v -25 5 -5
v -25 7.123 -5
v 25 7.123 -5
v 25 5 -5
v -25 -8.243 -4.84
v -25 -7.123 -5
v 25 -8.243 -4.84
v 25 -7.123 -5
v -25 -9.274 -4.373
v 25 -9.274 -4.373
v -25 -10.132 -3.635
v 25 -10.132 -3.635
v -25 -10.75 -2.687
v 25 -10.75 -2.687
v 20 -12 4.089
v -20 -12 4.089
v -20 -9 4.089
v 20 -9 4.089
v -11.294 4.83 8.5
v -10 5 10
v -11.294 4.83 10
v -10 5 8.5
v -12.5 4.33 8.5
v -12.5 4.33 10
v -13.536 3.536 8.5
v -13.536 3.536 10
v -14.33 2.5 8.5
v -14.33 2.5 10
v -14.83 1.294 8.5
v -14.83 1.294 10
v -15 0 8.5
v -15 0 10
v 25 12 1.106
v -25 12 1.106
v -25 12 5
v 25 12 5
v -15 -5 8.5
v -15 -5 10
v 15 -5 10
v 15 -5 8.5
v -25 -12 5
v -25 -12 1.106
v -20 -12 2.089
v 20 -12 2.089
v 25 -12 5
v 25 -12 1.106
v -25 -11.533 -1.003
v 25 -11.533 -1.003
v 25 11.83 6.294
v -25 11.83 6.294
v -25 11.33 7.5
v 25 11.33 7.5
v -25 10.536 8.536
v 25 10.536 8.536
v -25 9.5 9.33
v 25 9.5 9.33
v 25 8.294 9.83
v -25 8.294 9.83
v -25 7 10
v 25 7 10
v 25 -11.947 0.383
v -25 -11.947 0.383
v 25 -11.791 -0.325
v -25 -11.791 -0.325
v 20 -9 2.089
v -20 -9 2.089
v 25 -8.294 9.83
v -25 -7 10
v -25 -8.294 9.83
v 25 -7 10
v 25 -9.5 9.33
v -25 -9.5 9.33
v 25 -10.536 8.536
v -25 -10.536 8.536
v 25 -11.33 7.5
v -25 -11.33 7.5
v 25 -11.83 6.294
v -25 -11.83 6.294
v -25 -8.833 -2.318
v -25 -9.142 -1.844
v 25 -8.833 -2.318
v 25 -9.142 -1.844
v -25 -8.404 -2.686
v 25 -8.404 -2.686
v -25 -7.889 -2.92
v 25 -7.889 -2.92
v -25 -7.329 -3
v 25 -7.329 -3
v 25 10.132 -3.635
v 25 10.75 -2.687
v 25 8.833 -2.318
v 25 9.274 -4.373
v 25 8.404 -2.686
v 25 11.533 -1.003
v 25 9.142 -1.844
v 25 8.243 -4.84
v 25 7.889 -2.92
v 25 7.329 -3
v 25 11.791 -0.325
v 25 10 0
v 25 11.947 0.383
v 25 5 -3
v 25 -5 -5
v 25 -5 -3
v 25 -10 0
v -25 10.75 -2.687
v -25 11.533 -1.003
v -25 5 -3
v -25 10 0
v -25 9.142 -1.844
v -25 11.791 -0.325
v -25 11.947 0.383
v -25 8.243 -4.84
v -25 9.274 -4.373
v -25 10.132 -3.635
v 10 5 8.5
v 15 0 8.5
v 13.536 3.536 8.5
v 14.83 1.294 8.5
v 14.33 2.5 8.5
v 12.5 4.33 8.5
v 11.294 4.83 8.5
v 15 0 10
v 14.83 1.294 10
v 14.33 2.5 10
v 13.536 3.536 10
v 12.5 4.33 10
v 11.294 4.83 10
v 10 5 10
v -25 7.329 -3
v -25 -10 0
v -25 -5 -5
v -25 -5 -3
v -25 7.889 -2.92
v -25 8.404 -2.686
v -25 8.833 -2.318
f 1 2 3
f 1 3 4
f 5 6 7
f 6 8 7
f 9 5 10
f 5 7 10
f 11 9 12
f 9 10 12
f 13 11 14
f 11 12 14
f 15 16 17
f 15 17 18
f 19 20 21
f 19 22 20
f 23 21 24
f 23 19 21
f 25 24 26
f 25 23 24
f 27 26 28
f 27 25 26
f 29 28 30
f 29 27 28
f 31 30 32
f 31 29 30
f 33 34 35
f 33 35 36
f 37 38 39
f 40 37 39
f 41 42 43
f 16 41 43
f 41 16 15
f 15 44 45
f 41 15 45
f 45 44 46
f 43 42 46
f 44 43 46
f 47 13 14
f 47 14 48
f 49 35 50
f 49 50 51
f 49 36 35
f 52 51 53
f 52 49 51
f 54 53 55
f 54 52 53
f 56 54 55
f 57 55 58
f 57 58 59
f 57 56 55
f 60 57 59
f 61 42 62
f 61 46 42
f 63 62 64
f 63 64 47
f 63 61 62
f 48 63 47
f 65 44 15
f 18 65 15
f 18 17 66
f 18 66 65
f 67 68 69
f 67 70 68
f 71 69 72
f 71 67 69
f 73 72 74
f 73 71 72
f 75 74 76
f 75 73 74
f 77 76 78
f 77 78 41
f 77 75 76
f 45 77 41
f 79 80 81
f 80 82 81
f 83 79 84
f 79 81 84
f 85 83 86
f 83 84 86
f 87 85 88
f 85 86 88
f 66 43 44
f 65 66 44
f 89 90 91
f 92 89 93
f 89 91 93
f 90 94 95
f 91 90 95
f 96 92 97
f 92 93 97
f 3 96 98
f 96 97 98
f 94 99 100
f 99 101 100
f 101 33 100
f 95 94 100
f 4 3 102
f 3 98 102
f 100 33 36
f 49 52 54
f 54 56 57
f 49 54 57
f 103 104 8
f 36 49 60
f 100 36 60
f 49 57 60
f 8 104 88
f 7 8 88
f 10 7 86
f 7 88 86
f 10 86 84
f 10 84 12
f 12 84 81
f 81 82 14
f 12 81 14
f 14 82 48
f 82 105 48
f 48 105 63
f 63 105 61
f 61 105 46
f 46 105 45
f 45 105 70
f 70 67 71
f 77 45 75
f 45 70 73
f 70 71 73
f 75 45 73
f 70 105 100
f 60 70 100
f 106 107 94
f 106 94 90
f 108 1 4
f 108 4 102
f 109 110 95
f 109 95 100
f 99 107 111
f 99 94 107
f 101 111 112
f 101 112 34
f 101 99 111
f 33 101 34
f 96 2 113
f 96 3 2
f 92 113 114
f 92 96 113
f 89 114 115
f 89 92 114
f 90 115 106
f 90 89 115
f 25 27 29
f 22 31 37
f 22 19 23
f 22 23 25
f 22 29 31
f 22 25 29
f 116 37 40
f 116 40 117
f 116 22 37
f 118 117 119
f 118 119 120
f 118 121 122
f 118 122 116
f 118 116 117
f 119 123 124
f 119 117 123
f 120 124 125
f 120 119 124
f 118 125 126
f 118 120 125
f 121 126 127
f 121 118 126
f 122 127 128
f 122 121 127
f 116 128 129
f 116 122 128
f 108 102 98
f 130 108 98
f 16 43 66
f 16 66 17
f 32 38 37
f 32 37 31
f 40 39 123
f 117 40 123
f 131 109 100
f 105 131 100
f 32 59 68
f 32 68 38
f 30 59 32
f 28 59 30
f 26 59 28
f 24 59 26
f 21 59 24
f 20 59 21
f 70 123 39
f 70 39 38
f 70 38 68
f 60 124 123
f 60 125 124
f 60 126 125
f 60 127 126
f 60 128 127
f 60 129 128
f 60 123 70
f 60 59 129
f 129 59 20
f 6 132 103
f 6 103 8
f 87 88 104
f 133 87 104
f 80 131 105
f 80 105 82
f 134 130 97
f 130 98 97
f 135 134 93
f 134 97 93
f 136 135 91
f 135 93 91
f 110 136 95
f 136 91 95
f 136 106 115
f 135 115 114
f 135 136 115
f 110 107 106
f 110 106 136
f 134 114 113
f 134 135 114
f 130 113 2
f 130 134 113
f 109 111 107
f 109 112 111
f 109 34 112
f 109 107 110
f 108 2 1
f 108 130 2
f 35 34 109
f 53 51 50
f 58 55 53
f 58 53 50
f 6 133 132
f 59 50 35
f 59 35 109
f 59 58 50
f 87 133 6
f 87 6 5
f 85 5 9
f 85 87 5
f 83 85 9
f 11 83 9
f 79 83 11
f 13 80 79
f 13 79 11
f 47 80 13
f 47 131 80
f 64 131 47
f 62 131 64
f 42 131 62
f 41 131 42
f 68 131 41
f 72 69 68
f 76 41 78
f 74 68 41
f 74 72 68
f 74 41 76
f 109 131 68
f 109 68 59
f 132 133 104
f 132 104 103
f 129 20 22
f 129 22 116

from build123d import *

# Parameters (mm, degrees)
F0_W      = 50
F0_H      = 24
F1_DEPTH  = 10
F3_DEPTH  = 50
F4_R      = 5
F5_R      = 2
F6_R      = 4
F7_W      = 40
F7_H      = 2
F8_DEPTH  = 3
F9_W      = 30
F9_H      = 10
F10_DEPTH = 1.5
F11_R     = 5


with BuildPart() as f1:
    # F0 (on Top) → F1 (new body)
    with BuildSketch(Plane.XY):
        Rectangle(F0_W, F0_H)
    extrude(amount=F1_DEPTH)

    # F2 (on face) → F3 (join, through all)
    with BuildSketch(Plane(origin=(-25, 0, 0), x_dir=(0, -1, 0), z_dir=(-1, 0, 0))):
        Polygon((-10, 0), (-12, 0), (-9.673886, -5), (-5, -5), (-5, -3), (-8.604331, -3), align=None)
        Polygon((12, 0), (10, 0), (8.604331, -3), (5, -3), (5, -5), (9.673886, -5), align=None)
    extrude(amount=-F3_DEPTH)

    # F4
    f4_edges = [f1.edges().sort_by_distance(p)[0] for p in [
        (0, 12, 10),
        (0, -12, 10),
        (0, 12, 0),
        (0, -12, 0),
    ]]
    fillet(f4_edges, radius=F4_R)

    # F5
    f5_edges = [f1.edges().sort_by_distance(p)[0] for p in [
        (0, 8.604331, -3),
        (0, -8.604331, -3),
    ]]
    fillet(f5_edges, radius=F5_R)

    # F6
    f6_edges = [f1.edges().sort_by_distance(p)[0] for p in [
        (0, 9.673886, -5),
        (0, -9.673886, -5),
    ]]
    fillet(f6_edges, radius=F6_R)

    # F7 (on face) → F8 (cut)
    with BuildSketch(Plane.XZ.offset(12)):
        with Locations((0, 3.088876)):
            Rectangle(F7_W, F7_H)
    extrude(amount=-F8_DEPTH, mode=Mode.SUBTRACT)

    # F9 (on face) → F10 (cut)
    with BuildSketch(Plane.XY.offset(10)):
        Rectangle(F9_W, F9_H)
    extrude(amount=-F10_DEPTH, mode=Mode.SUBTRACT)

    # F11
    f11_edges = [f1.edges().sort_by_distance(p)[0] for p in [
        (-15, 5, 9.25),
        (15, 5, 9.25),
    ]]
    fillet(f11_edges, radius=F11_R)


solid = f1.part
